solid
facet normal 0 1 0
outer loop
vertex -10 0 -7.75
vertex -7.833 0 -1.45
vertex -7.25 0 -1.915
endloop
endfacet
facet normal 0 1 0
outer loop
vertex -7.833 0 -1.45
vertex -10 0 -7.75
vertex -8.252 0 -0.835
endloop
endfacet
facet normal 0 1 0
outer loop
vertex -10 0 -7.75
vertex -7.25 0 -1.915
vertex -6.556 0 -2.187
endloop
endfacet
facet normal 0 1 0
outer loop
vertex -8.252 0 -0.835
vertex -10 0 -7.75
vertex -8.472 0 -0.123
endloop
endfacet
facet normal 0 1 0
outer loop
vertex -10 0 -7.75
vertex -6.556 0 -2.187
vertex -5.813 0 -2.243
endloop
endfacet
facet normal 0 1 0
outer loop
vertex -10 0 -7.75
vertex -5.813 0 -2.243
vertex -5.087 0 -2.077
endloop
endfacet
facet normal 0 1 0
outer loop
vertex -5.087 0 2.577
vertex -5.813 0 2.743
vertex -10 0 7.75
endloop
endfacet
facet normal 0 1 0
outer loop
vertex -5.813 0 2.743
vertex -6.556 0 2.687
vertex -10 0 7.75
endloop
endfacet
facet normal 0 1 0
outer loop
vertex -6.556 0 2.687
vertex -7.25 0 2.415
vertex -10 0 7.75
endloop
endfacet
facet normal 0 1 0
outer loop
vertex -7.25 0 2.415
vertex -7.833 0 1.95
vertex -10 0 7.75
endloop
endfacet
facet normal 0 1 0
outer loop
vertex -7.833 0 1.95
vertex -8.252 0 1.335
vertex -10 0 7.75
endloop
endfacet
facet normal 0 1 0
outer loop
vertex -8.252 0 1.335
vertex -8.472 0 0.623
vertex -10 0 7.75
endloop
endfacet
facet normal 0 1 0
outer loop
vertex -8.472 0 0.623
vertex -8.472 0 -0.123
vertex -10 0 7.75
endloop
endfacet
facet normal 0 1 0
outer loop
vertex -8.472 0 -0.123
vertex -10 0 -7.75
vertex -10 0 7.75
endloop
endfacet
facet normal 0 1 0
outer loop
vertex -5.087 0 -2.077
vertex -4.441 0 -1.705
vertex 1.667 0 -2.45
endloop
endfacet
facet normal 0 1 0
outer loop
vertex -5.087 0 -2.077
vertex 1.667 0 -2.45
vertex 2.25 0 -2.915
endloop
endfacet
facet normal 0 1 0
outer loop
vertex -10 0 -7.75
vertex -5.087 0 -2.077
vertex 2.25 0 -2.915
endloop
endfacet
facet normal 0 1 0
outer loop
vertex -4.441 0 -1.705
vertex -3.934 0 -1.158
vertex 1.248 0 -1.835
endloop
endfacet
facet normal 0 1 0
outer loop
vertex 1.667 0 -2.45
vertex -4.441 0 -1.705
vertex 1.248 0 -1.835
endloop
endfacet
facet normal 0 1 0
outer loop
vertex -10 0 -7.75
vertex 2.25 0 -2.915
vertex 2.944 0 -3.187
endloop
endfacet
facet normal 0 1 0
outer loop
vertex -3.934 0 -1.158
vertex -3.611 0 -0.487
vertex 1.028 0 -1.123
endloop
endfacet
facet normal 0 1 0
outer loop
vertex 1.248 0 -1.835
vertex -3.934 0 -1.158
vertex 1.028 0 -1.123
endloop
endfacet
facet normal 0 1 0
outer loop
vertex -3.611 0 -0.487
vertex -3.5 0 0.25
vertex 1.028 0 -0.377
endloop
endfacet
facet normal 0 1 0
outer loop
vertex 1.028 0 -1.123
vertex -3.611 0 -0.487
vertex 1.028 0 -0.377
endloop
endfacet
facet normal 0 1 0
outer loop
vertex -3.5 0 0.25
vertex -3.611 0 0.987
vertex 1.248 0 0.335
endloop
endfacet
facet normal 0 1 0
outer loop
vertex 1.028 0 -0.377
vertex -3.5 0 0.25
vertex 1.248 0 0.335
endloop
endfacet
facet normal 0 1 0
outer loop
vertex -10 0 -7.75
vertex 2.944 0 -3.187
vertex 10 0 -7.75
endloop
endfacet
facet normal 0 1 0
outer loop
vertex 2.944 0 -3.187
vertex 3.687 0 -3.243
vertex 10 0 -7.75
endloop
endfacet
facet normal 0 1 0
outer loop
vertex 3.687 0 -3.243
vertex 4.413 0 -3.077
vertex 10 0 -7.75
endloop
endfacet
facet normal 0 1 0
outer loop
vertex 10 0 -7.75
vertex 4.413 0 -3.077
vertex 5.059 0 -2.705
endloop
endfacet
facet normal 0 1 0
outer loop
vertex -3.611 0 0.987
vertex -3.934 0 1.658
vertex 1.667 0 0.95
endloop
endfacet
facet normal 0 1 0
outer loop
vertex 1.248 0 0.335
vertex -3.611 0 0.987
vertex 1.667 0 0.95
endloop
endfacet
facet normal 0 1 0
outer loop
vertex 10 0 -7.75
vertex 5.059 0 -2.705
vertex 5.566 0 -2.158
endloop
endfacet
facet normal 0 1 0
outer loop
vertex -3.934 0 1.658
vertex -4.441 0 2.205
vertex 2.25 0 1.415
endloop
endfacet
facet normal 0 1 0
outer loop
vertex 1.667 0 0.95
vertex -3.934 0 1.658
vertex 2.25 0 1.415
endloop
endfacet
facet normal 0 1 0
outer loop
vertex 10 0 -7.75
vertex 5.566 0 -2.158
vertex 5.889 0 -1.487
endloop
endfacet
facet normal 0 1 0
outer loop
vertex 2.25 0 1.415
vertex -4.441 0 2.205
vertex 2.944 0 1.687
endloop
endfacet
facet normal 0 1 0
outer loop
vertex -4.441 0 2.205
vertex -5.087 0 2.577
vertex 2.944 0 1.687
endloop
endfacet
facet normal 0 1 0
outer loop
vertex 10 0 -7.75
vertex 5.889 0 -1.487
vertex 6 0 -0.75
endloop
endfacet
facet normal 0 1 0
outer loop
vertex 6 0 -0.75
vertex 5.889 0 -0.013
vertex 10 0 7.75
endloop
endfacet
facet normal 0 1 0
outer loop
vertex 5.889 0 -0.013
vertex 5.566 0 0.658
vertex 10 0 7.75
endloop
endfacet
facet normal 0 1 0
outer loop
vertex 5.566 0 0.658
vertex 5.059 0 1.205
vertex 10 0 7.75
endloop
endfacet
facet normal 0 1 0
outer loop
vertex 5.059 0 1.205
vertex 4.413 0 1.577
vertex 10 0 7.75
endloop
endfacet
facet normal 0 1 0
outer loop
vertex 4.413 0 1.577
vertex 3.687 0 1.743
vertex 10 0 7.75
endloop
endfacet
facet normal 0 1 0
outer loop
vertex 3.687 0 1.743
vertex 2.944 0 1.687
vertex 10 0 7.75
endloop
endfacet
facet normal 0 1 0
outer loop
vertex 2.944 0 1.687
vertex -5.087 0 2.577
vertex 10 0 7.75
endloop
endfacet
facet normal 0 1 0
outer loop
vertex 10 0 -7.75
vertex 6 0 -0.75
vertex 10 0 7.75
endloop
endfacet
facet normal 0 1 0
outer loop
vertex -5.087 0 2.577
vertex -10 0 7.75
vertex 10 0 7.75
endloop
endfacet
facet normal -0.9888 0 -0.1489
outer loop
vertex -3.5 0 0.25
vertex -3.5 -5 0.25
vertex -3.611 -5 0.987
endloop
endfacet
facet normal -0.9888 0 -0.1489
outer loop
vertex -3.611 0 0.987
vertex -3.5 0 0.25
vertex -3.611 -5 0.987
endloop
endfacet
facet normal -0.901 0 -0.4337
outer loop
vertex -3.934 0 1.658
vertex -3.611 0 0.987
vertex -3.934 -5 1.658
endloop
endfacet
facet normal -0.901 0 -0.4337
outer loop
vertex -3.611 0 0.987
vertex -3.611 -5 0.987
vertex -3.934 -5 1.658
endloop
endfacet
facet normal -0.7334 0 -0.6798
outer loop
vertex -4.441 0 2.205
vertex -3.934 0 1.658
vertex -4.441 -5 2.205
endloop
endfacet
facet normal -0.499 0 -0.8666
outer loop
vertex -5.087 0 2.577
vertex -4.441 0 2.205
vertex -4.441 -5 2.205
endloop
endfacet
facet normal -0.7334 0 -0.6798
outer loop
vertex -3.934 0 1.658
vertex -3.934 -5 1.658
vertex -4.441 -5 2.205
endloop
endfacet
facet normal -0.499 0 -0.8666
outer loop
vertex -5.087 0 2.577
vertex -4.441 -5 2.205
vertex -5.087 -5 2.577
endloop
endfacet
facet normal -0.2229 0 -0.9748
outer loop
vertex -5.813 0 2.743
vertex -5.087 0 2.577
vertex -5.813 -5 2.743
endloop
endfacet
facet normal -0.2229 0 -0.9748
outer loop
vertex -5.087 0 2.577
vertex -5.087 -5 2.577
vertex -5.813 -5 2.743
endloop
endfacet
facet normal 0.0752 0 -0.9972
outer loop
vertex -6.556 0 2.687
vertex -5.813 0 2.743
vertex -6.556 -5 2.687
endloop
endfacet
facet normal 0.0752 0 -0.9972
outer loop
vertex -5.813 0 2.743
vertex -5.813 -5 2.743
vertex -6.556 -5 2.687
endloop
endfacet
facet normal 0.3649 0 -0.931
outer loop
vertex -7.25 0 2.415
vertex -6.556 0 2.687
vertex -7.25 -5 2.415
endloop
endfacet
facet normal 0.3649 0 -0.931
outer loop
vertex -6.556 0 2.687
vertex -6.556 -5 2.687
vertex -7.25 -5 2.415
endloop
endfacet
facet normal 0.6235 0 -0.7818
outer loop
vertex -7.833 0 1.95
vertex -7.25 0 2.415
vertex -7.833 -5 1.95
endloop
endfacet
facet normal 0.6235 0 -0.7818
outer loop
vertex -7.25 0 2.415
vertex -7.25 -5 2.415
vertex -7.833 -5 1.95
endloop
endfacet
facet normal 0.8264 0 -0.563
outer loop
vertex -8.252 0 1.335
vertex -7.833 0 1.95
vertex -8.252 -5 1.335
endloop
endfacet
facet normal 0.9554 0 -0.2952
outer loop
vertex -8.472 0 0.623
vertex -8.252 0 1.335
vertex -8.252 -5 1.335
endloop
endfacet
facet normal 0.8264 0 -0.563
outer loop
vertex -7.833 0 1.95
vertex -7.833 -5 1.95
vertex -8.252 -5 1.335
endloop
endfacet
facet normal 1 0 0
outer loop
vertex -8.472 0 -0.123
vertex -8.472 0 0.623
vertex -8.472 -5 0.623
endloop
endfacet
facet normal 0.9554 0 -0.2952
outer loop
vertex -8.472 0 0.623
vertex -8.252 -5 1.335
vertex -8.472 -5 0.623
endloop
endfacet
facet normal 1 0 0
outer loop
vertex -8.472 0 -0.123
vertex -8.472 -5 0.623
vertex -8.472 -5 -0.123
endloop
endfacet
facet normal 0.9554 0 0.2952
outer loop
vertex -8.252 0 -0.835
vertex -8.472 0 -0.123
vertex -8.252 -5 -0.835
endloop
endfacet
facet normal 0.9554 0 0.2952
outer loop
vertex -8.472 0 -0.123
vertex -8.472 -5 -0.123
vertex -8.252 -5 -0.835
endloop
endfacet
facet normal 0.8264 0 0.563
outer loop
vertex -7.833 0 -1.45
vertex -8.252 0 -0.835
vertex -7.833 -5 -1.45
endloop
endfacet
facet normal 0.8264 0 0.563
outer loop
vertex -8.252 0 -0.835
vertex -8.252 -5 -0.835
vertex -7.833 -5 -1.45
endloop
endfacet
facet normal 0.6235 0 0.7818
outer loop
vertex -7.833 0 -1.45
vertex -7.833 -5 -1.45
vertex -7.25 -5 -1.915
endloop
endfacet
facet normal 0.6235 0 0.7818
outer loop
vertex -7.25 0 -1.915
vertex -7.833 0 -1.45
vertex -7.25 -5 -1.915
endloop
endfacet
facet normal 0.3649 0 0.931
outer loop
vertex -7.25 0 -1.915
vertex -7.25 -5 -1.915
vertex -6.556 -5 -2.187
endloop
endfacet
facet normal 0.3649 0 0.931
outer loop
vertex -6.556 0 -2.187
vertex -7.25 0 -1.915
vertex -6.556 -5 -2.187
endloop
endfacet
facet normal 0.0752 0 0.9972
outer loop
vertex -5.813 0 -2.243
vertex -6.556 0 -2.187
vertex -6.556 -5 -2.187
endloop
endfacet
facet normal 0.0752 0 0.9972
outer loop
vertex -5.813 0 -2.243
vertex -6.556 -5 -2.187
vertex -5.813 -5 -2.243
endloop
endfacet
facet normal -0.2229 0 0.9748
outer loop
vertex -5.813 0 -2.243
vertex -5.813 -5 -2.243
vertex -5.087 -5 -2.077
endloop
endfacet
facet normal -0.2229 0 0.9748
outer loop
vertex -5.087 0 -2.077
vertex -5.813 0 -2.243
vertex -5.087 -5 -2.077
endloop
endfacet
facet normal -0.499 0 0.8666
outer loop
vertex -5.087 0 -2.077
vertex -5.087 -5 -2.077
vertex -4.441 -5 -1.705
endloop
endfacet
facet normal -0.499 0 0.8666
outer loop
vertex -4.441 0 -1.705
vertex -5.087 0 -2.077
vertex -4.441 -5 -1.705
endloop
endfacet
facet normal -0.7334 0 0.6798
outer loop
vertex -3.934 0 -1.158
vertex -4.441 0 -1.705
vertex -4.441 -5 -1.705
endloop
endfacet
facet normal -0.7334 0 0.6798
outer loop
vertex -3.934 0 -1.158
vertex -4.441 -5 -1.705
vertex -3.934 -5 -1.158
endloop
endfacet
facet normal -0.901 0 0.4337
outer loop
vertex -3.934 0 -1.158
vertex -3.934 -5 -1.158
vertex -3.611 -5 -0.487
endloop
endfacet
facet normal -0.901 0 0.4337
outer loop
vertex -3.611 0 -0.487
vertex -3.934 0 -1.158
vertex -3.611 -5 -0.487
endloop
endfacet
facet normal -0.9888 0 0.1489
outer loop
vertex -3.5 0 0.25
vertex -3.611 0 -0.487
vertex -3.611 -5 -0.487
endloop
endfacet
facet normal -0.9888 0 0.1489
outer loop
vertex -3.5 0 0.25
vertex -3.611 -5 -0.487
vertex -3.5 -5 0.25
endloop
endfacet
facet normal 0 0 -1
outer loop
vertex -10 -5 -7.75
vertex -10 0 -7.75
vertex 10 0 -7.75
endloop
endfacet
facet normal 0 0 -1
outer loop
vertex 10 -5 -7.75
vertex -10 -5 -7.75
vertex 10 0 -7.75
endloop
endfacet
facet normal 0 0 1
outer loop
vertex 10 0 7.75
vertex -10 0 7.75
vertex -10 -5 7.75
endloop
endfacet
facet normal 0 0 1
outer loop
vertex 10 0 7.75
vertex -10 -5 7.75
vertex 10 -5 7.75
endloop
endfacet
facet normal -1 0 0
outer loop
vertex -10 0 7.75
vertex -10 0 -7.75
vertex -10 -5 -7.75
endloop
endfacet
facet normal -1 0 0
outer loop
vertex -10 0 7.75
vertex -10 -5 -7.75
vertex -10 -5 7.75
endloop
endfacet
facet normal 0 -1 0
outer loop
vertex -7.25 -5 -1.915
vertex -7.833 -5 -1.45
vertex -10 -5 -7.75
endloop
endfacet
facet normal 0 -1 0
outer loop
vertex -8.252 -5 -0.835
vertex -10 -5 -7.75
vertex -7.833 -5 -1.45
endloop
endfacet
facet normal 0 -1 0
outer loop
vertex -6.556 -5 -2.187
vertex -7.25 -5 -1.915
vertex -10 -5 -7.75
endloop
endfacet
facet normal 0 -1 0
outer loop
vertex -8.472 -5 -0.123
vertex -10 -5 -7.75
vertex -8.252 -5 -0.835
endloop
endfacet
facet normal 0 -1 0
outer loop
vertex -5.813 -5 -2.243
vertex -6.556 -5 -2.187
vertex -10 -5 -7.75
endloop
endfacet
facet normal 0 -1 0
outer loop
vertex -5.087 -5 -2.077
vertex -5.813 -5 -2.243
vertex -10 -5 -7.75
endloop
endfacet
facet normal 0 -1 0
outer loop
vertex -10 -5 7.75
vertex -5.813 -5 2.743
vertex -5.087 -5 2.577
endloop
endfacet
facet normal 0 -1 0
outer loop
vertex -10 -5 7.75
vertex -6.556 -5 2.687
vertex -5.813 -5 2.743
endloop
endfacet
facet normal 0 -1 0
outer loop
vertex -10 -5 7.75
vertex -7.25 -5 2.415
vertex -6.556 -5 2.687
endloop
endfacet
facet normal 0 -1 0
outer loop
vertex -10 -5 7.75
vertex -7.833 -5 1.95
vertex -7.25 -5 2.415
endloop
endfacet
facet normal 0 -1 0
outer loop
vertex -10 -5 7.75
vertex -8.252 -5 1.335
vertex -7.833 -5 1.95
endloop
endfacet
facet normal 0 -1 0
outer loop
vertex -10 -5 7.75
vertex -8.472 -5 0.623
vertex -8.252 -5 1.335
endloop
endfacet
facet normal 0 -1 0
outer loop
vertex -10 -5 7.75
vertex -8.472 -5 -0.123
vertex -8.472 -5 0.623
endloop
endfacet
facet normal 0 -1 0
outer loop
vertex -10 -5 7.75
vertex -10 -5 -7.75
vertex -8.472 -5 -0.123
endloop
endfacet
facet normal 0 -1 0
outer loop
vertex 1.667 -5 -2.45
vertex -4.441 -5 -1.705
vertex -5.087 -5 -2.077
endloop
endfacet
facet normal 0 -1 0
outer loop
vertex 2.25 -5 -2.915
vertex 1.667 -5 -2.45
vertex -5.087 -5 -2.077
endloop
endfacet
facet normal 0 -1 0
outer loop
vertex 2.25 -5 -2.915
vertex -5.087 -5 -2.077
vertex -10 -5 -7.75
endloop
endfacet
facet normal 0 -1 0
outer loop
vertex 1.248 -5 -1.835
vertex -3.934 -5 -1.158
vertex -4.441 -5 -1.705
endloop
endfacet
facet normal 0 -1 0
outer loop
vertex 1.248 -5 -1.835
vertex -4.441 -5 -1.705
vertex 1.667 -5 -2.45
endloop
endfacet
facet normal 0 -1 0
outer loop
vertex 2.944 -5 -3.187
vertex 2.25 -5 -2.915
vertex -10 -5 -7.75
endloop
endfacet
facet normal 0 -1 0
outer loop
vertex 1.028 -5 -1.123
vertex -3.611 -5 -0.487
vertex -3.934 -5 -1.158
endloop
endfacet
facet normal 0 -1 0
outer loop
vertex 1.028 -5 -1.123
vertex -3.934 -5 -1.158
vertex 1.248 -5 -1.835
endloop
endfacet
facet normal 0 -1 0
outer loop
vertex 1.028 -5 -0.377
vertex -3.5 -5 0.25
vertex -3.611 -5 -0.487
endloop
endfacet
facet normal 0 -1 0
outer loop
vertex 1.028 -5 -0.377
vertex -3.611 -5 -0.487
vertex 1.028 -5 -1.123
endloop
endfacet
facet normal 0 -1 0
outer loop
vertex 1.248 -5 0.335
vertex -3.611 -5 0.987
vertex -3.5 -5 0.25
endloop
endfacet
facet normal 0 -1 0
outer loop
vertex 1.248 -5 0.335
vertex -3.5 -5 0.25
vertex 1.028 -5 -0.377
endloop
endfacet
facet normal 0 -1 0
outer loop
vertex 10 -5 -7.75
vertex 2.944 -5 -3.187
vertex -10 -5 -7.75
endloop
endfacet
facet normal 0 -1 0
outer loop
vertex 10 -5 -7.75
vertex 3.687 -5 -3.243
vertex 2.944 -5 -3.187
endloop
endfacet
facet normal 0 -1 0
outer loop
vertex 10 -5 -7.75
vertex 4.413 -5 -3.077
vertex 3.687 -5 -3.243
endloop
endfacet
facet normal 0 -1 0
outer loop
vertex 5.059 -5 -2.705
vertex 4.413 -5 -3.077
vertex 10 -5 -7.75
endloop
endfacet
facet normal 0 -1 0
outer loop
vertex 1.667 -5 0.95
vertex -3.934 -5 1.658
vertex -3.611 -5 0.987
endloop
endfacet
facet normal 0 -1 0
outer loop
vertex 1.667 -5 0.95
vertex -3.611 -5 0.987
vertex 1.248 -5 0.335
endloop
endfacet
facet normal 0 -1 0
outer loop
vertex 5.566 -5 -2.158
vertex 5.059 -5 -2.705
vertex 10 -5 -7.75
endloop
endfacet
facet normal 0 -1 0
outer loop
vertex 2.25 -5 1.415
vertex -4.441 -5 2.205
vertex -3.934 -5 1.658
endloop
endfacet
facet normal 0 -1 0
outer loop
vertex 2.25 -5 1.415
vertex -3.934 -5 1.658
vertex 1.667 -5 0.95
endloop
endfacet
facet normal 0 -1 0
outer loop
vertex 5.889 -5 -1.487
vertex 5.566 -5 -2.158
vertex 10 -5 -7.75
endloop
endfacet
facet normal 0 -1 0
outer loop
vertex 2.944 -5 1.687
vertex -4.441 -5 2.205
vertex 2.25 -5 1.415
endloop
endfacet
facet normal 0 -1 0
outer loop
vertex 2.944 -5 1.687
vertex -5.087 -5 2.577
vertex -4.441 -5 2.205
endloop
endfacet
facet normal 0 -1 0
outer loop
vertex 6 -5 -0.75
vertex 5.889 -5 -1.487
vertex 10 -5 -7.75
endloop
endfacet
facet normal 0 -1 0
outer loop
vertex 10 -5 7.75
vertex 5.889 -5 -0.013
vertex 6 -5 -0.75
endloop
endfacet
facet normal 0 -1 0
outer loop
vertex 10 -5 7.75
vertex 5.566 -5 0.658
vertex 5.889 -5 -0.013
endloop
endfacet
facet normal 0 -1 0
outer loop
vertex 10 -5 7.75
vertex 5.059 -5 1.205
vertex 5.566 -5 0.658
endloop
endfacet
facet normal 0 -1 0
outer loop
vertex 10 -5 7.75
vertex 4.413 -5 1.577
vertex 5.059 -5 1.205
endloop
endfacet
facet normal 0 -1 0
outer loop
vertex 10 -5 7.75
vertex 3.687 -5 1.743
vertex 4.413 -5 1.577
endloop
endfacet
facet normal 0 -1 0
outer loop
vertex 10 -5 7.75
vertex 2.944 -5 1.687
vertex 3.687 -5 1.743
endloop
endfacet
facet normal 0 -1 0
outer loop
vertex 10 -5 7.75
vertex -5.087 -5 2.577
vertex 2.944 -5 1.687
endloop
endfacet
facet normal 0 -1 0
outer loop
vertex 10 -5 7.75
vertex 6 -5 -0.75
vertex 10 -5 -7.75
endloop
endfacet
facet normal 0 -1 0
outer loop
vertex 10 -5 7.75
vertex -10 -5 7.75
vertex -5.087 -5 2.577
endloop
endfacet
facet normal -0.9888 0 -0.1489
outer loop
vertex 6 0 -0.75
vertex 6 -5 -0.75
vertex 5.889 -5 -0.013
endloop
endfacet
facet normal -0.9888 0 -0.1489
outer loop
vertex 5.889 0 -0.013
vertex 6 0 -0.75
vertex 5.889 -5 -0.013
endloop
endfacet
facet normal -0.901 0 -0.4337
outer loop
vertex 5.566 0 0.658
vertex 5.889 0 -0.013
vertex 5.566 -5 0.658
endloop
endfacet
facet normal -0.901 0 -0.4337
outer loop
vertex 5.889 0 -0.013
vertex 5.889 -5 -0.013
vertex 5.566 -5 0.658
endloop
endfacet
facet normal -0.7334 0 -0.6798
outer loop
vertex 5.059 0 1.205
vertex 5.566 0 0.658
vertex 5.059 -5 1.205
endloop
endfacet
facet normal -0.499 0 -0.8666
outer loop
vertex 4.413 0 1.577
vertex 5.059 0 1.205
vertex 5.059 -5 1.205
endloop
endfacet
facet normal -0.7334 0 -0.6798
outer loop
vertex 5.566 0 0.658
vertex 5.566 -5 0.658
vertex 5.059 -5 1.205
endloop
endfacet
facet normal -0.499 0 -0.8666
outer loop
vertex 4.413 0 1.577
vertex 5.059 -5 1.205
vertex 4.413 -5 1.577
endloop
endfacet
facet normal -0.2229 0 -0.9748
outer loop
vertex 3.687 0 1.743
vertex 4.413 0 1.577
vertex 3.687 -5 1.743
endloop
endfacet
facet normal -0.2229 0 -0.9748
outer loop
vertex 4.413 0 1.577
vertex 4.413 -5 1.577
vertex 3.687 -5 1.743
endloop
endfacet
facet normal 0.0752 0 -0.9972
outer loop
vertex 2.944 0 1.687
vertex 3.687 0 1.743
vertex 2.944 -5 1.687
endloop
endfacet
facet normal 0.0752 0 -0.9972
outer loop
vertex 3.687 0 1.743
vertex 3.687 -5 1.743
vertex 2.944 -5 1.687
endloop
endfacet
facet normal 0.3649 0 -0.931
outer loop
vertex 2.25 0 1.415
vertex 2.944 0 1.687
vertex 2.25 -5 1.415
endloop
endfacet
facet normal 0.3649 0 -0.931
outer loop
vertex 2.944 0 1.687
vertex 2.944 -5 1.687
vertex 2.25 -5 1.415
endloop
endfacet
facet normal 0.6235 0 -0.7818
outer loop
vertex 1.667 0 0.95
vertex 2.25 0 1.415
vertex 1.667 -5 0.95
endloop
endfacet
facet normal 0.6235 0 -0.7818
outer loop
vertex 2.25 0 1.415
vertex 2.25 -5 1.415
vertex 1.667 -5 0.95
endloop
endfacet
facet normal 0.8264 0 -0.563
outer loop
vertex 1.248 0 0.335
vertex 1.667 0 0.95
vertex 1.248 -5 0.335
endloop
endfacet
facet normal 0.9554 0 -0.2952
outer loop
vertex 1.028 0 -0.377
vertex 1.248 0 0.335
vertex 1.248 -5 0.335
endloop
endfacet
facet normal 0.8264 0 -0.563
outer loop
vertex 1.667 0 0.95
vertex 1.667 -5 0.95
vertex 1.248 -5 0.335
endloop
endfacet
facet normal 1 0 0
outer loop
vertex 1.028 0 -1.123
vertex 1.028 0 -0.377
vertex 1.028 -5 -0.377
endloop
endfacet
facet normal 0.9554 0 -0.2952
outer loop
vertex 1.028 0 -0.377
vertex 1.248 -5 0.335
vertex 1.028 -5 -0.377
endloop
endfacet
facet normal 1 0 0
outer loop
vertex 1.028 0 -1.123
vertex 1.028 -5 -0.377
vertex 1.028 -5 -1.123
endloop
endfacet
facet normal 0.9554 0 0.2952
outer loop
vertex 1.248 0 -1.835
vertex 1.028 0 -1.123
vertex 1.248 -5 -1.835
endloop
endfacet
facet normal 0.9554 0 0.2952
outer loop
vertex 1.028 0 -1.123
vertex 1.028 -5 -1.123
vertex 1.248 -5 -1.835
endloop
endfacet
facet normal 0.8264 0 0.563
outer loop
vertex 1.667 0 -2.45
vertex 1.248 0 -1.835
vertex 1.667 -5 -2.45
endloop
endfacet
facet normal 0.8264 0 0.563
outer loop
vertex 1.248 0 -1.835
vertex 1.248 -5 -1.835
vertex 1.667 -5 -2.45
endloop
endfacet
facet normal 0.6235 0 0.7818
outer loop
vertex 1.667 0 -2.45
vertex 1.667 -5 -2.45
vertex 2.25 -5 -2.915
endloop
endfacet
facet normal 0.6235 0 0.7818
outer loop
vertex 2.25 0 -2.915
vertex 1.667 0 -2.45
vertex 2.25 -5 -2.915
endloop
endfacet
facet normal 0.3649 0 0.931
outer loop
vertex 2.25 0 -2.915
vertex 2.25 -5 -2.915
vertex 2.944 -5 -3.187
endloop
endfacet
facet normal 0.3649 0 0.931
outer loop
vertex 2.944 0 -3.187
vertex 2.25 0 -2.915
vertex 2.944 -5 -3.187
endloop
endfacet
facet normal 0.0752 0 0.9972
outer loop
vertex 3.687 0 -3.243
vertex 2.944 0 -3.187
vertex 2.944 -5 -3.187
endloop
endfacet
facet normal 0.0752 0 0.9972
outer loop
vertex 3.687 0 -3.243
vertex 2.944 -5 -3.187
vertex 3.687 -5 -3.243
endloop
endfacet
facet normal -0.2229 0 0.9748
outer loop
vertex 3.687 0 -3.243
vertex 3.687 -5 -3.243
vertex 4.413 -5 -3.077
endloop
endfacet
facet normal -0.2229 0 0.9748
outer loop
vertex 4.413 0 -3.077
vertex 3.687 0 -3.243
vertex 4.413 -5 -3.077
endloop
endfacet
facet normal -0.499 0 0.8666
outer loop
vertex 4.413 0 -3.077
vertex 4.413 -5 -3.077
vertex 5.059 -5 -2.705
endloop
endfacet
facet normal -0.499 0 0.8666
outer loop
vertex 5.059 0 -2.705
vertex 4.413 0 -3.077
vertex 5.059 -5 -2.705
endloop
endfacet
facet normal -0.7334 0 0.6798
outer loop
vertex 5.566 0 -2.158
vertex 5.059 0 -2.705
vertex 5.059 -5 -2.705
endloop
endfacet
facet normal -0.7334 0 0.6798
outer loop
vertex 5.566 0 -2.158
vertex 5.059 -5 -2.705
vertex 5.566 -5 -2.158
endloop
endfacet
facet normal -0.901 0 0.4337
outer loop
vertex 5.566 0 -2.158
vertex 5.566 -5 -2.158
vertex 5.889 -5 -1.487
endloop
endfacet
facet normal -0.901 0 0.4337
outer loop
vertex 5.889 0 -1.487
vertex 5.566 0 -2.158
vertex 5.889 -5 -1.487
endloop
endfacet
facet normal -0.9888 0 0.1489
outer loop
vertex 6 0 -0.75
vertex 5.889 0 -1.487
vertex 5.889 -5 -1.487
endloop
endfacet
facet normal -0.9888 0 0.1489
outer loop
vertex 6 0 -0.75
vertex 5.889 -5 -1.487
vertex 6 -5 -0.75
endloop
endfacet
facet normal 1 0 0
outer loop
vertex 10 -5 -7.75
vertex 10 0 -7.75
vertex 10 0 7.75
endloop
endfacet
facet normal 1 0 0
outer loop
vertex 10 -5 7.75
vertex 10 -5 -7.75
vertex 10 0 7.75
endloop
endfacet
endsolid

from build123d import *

# Parameters (mm, degrees)
F0_W     = 20
F0_H     = 15.5
F1_DEPTH = 5
F2_R     = 2.5
F3_DEPTH = 25
F4_DEPTH = 25


with BuildPart() as f1:
    # F0 (on Front) → F1 (new body)
    with BuildSketch(Plane.XZ):
        Rectangle(F0_W, F0_H)
    extrude(amount=F1_DEPTH)

    # F2 (on face) → F3 (cut)
    with BuildSketch(Plane.XZ.offset(5)):
        with Locations((-6, 0.25)):
            Circle(F2_R)
    extrude(amount=-F3_DEPTH, mode=Mode.SUBTRACT)

    # F2 (on face) → F4 (cut)
    with BuildSketch(Plane.XZ.offset(5)):
        with Locations((3.5, -0.75)):
            Circle(F2_R)
    extrude(amount=-F4_DEPTH, mode=Mode.SUBTRACT)


solid = f1.part
